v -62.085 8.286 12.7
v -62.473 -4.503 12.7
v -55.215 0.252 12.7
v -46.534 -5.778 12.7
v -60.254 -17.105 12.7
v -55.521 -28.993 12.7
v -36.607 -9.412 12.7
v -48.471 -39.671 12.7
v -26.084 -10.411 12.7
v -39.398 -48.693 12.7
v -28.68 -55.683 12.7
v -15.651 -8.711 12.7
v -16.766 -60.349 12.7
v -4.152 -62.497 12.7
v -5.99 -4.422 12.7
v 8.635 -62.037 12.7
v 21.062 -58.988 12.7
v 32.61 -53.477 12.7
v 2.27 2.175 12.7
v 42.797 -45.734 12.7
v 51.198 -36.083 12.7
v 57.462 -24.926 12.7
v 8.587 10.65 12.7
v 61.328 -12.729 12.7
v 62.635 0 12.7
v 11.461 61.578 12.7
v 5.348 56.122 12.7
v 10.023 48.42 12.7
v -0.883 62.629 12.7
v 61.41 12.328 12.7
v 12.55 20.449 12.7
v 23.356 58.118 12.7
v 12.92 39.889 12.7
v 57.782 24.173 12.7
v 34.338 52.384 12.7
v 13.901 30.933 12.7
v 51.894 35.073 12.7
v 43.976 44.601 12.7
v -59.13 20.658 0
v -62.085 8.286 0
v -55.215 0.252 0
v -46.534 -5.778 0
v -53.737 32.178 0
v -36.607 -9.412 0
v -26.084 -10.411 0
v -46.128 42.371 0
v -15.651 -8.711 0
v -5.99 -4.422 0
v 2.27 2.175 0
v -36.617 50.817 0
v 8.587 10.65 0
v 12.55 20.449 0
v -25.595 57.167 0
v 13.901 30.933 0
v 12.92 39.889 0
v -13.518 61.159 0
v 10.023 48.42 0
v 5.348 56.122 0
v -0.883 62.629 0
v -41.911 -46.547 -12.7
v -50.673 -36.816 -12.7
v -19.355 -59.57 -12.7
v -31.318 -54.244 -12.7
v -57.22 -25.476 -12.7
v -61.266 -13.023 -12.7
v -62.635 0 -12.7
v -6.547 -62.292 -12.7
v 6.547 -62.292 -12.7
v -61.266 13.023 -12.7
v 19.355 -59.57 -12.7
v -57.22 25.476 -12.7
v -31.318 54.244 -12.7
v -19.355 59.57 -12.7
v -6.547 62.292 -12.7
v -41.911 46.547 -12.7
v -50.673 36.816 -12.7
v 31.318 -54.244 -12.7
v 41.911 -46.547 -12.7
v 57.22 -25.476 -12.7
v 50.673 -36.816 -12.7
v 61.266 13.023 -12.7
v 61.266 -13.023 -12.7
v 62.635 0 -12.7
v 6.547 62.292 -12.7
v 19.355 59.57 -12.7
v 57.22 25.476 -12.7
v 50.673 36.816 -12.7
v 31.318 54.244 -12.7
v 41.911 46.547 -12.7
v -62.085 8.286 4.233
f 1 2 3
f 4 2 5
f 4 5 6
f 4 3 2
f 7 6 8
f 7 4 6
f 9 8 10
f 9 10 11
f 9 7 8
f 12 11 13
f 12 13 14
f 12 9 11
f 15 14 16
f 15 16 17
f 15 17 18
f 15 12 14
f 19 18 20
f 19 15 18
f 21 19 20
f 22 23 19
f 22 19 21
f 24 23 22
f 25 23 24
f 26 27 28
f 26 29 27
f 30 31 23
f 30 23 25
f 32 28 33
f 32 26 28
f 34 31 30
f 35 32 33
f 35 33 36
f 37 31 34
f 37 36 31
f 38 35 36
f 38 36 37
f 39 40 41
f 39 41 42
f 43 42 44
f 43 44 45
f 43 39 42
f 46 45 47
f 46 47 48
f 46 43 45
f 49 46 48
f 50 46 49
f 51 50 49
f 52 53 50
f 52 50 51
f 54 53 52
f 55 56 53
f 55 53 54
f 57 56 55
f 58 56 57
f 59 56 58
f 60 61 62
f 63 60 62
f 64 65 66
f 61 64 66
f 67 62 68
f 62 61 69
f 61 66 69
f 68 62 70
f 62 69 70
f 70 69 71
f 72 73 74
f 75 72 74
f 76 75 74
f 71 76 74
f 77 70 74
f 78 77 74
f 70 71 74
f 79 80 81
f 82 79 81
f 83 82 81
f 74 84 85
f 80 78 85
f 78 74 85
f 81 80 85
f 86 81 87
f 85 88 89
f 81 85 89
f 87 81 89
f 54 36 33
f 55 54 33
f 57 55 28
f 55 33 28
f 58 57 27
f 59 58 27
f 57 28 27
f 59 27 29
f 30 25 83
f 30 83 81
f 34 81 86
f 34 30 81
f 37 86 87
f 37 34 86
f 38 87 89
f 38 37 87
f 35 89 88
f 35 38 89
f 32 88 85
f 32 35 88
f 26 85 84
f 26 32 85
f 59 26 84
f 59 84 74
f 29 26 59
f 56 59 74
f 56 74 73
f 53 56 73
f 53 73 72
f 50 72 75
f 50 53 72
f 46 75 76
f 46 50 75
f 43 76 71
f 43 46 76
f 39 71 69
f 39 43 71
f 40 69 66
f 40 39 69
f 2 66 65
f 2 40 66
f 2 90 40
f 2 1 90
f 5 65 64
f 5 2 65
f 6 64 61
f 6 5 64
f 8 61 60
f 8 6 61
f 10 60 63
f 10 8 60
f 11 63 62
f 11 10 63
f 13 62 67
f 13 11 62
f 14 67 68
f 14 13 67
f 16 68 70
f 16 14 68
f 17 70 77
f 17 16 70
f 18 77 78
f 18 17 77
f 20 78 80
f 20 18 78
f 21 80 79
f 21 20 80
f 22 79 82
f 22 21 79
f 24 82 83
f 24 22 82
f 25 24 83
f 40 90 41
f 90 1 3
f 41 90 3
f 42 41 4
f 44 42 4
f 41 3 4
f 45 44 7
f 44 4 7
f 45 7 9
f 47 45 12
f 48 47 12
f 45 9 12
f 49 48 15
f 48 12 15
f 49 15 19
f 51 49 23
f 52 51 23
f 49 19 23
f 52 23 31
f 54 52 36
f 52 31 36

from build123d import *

# Parameters (mm, degrees)
F0_R     = 62.635171
F1_DEPTH = 12.7
F3_DEPTH = 12.7


with BuildPart() as f1:
    # F0 (on Top) → F1 (new body, symmetric)
    with BuildSketch(Plane.XY):
        Circle(F0_R)
    extrude(amount=F1_DEPTH, both=True)

    # F2 (on face) → F3 (cut, symmetric)
    with BuildSketch(Plane.XY.offset(12.7)):
        with BuildLine():
            ThreePointArc((-62.084642, 8.286243), (-41.587534, 46.836328), (-0.88331, 62.628942))
            ThreePointArc((-0.88331, 62.628942), (-54.933436, 61.866626), (-62.084642, 8.286243))
        make_face()
        with BuildLine():
            ThreePointArc((-62.084642, 8.286243), (-15.650946, -8.711081), (13.901029, 30.933313))
            ThreePointArc((13.901029, 30.933313), (10.023188, 48.420377), (-0.88331, 62.628942))
            ThreePointArc((-0.88331, 62.628942), (-41.587534, 46.836328), (-62.084642, 8.286243))
        make_face()
    extrude(amount=F3_DEPTH, both=True, mode=Mode.SUBTRACT)


solid = f1.part
